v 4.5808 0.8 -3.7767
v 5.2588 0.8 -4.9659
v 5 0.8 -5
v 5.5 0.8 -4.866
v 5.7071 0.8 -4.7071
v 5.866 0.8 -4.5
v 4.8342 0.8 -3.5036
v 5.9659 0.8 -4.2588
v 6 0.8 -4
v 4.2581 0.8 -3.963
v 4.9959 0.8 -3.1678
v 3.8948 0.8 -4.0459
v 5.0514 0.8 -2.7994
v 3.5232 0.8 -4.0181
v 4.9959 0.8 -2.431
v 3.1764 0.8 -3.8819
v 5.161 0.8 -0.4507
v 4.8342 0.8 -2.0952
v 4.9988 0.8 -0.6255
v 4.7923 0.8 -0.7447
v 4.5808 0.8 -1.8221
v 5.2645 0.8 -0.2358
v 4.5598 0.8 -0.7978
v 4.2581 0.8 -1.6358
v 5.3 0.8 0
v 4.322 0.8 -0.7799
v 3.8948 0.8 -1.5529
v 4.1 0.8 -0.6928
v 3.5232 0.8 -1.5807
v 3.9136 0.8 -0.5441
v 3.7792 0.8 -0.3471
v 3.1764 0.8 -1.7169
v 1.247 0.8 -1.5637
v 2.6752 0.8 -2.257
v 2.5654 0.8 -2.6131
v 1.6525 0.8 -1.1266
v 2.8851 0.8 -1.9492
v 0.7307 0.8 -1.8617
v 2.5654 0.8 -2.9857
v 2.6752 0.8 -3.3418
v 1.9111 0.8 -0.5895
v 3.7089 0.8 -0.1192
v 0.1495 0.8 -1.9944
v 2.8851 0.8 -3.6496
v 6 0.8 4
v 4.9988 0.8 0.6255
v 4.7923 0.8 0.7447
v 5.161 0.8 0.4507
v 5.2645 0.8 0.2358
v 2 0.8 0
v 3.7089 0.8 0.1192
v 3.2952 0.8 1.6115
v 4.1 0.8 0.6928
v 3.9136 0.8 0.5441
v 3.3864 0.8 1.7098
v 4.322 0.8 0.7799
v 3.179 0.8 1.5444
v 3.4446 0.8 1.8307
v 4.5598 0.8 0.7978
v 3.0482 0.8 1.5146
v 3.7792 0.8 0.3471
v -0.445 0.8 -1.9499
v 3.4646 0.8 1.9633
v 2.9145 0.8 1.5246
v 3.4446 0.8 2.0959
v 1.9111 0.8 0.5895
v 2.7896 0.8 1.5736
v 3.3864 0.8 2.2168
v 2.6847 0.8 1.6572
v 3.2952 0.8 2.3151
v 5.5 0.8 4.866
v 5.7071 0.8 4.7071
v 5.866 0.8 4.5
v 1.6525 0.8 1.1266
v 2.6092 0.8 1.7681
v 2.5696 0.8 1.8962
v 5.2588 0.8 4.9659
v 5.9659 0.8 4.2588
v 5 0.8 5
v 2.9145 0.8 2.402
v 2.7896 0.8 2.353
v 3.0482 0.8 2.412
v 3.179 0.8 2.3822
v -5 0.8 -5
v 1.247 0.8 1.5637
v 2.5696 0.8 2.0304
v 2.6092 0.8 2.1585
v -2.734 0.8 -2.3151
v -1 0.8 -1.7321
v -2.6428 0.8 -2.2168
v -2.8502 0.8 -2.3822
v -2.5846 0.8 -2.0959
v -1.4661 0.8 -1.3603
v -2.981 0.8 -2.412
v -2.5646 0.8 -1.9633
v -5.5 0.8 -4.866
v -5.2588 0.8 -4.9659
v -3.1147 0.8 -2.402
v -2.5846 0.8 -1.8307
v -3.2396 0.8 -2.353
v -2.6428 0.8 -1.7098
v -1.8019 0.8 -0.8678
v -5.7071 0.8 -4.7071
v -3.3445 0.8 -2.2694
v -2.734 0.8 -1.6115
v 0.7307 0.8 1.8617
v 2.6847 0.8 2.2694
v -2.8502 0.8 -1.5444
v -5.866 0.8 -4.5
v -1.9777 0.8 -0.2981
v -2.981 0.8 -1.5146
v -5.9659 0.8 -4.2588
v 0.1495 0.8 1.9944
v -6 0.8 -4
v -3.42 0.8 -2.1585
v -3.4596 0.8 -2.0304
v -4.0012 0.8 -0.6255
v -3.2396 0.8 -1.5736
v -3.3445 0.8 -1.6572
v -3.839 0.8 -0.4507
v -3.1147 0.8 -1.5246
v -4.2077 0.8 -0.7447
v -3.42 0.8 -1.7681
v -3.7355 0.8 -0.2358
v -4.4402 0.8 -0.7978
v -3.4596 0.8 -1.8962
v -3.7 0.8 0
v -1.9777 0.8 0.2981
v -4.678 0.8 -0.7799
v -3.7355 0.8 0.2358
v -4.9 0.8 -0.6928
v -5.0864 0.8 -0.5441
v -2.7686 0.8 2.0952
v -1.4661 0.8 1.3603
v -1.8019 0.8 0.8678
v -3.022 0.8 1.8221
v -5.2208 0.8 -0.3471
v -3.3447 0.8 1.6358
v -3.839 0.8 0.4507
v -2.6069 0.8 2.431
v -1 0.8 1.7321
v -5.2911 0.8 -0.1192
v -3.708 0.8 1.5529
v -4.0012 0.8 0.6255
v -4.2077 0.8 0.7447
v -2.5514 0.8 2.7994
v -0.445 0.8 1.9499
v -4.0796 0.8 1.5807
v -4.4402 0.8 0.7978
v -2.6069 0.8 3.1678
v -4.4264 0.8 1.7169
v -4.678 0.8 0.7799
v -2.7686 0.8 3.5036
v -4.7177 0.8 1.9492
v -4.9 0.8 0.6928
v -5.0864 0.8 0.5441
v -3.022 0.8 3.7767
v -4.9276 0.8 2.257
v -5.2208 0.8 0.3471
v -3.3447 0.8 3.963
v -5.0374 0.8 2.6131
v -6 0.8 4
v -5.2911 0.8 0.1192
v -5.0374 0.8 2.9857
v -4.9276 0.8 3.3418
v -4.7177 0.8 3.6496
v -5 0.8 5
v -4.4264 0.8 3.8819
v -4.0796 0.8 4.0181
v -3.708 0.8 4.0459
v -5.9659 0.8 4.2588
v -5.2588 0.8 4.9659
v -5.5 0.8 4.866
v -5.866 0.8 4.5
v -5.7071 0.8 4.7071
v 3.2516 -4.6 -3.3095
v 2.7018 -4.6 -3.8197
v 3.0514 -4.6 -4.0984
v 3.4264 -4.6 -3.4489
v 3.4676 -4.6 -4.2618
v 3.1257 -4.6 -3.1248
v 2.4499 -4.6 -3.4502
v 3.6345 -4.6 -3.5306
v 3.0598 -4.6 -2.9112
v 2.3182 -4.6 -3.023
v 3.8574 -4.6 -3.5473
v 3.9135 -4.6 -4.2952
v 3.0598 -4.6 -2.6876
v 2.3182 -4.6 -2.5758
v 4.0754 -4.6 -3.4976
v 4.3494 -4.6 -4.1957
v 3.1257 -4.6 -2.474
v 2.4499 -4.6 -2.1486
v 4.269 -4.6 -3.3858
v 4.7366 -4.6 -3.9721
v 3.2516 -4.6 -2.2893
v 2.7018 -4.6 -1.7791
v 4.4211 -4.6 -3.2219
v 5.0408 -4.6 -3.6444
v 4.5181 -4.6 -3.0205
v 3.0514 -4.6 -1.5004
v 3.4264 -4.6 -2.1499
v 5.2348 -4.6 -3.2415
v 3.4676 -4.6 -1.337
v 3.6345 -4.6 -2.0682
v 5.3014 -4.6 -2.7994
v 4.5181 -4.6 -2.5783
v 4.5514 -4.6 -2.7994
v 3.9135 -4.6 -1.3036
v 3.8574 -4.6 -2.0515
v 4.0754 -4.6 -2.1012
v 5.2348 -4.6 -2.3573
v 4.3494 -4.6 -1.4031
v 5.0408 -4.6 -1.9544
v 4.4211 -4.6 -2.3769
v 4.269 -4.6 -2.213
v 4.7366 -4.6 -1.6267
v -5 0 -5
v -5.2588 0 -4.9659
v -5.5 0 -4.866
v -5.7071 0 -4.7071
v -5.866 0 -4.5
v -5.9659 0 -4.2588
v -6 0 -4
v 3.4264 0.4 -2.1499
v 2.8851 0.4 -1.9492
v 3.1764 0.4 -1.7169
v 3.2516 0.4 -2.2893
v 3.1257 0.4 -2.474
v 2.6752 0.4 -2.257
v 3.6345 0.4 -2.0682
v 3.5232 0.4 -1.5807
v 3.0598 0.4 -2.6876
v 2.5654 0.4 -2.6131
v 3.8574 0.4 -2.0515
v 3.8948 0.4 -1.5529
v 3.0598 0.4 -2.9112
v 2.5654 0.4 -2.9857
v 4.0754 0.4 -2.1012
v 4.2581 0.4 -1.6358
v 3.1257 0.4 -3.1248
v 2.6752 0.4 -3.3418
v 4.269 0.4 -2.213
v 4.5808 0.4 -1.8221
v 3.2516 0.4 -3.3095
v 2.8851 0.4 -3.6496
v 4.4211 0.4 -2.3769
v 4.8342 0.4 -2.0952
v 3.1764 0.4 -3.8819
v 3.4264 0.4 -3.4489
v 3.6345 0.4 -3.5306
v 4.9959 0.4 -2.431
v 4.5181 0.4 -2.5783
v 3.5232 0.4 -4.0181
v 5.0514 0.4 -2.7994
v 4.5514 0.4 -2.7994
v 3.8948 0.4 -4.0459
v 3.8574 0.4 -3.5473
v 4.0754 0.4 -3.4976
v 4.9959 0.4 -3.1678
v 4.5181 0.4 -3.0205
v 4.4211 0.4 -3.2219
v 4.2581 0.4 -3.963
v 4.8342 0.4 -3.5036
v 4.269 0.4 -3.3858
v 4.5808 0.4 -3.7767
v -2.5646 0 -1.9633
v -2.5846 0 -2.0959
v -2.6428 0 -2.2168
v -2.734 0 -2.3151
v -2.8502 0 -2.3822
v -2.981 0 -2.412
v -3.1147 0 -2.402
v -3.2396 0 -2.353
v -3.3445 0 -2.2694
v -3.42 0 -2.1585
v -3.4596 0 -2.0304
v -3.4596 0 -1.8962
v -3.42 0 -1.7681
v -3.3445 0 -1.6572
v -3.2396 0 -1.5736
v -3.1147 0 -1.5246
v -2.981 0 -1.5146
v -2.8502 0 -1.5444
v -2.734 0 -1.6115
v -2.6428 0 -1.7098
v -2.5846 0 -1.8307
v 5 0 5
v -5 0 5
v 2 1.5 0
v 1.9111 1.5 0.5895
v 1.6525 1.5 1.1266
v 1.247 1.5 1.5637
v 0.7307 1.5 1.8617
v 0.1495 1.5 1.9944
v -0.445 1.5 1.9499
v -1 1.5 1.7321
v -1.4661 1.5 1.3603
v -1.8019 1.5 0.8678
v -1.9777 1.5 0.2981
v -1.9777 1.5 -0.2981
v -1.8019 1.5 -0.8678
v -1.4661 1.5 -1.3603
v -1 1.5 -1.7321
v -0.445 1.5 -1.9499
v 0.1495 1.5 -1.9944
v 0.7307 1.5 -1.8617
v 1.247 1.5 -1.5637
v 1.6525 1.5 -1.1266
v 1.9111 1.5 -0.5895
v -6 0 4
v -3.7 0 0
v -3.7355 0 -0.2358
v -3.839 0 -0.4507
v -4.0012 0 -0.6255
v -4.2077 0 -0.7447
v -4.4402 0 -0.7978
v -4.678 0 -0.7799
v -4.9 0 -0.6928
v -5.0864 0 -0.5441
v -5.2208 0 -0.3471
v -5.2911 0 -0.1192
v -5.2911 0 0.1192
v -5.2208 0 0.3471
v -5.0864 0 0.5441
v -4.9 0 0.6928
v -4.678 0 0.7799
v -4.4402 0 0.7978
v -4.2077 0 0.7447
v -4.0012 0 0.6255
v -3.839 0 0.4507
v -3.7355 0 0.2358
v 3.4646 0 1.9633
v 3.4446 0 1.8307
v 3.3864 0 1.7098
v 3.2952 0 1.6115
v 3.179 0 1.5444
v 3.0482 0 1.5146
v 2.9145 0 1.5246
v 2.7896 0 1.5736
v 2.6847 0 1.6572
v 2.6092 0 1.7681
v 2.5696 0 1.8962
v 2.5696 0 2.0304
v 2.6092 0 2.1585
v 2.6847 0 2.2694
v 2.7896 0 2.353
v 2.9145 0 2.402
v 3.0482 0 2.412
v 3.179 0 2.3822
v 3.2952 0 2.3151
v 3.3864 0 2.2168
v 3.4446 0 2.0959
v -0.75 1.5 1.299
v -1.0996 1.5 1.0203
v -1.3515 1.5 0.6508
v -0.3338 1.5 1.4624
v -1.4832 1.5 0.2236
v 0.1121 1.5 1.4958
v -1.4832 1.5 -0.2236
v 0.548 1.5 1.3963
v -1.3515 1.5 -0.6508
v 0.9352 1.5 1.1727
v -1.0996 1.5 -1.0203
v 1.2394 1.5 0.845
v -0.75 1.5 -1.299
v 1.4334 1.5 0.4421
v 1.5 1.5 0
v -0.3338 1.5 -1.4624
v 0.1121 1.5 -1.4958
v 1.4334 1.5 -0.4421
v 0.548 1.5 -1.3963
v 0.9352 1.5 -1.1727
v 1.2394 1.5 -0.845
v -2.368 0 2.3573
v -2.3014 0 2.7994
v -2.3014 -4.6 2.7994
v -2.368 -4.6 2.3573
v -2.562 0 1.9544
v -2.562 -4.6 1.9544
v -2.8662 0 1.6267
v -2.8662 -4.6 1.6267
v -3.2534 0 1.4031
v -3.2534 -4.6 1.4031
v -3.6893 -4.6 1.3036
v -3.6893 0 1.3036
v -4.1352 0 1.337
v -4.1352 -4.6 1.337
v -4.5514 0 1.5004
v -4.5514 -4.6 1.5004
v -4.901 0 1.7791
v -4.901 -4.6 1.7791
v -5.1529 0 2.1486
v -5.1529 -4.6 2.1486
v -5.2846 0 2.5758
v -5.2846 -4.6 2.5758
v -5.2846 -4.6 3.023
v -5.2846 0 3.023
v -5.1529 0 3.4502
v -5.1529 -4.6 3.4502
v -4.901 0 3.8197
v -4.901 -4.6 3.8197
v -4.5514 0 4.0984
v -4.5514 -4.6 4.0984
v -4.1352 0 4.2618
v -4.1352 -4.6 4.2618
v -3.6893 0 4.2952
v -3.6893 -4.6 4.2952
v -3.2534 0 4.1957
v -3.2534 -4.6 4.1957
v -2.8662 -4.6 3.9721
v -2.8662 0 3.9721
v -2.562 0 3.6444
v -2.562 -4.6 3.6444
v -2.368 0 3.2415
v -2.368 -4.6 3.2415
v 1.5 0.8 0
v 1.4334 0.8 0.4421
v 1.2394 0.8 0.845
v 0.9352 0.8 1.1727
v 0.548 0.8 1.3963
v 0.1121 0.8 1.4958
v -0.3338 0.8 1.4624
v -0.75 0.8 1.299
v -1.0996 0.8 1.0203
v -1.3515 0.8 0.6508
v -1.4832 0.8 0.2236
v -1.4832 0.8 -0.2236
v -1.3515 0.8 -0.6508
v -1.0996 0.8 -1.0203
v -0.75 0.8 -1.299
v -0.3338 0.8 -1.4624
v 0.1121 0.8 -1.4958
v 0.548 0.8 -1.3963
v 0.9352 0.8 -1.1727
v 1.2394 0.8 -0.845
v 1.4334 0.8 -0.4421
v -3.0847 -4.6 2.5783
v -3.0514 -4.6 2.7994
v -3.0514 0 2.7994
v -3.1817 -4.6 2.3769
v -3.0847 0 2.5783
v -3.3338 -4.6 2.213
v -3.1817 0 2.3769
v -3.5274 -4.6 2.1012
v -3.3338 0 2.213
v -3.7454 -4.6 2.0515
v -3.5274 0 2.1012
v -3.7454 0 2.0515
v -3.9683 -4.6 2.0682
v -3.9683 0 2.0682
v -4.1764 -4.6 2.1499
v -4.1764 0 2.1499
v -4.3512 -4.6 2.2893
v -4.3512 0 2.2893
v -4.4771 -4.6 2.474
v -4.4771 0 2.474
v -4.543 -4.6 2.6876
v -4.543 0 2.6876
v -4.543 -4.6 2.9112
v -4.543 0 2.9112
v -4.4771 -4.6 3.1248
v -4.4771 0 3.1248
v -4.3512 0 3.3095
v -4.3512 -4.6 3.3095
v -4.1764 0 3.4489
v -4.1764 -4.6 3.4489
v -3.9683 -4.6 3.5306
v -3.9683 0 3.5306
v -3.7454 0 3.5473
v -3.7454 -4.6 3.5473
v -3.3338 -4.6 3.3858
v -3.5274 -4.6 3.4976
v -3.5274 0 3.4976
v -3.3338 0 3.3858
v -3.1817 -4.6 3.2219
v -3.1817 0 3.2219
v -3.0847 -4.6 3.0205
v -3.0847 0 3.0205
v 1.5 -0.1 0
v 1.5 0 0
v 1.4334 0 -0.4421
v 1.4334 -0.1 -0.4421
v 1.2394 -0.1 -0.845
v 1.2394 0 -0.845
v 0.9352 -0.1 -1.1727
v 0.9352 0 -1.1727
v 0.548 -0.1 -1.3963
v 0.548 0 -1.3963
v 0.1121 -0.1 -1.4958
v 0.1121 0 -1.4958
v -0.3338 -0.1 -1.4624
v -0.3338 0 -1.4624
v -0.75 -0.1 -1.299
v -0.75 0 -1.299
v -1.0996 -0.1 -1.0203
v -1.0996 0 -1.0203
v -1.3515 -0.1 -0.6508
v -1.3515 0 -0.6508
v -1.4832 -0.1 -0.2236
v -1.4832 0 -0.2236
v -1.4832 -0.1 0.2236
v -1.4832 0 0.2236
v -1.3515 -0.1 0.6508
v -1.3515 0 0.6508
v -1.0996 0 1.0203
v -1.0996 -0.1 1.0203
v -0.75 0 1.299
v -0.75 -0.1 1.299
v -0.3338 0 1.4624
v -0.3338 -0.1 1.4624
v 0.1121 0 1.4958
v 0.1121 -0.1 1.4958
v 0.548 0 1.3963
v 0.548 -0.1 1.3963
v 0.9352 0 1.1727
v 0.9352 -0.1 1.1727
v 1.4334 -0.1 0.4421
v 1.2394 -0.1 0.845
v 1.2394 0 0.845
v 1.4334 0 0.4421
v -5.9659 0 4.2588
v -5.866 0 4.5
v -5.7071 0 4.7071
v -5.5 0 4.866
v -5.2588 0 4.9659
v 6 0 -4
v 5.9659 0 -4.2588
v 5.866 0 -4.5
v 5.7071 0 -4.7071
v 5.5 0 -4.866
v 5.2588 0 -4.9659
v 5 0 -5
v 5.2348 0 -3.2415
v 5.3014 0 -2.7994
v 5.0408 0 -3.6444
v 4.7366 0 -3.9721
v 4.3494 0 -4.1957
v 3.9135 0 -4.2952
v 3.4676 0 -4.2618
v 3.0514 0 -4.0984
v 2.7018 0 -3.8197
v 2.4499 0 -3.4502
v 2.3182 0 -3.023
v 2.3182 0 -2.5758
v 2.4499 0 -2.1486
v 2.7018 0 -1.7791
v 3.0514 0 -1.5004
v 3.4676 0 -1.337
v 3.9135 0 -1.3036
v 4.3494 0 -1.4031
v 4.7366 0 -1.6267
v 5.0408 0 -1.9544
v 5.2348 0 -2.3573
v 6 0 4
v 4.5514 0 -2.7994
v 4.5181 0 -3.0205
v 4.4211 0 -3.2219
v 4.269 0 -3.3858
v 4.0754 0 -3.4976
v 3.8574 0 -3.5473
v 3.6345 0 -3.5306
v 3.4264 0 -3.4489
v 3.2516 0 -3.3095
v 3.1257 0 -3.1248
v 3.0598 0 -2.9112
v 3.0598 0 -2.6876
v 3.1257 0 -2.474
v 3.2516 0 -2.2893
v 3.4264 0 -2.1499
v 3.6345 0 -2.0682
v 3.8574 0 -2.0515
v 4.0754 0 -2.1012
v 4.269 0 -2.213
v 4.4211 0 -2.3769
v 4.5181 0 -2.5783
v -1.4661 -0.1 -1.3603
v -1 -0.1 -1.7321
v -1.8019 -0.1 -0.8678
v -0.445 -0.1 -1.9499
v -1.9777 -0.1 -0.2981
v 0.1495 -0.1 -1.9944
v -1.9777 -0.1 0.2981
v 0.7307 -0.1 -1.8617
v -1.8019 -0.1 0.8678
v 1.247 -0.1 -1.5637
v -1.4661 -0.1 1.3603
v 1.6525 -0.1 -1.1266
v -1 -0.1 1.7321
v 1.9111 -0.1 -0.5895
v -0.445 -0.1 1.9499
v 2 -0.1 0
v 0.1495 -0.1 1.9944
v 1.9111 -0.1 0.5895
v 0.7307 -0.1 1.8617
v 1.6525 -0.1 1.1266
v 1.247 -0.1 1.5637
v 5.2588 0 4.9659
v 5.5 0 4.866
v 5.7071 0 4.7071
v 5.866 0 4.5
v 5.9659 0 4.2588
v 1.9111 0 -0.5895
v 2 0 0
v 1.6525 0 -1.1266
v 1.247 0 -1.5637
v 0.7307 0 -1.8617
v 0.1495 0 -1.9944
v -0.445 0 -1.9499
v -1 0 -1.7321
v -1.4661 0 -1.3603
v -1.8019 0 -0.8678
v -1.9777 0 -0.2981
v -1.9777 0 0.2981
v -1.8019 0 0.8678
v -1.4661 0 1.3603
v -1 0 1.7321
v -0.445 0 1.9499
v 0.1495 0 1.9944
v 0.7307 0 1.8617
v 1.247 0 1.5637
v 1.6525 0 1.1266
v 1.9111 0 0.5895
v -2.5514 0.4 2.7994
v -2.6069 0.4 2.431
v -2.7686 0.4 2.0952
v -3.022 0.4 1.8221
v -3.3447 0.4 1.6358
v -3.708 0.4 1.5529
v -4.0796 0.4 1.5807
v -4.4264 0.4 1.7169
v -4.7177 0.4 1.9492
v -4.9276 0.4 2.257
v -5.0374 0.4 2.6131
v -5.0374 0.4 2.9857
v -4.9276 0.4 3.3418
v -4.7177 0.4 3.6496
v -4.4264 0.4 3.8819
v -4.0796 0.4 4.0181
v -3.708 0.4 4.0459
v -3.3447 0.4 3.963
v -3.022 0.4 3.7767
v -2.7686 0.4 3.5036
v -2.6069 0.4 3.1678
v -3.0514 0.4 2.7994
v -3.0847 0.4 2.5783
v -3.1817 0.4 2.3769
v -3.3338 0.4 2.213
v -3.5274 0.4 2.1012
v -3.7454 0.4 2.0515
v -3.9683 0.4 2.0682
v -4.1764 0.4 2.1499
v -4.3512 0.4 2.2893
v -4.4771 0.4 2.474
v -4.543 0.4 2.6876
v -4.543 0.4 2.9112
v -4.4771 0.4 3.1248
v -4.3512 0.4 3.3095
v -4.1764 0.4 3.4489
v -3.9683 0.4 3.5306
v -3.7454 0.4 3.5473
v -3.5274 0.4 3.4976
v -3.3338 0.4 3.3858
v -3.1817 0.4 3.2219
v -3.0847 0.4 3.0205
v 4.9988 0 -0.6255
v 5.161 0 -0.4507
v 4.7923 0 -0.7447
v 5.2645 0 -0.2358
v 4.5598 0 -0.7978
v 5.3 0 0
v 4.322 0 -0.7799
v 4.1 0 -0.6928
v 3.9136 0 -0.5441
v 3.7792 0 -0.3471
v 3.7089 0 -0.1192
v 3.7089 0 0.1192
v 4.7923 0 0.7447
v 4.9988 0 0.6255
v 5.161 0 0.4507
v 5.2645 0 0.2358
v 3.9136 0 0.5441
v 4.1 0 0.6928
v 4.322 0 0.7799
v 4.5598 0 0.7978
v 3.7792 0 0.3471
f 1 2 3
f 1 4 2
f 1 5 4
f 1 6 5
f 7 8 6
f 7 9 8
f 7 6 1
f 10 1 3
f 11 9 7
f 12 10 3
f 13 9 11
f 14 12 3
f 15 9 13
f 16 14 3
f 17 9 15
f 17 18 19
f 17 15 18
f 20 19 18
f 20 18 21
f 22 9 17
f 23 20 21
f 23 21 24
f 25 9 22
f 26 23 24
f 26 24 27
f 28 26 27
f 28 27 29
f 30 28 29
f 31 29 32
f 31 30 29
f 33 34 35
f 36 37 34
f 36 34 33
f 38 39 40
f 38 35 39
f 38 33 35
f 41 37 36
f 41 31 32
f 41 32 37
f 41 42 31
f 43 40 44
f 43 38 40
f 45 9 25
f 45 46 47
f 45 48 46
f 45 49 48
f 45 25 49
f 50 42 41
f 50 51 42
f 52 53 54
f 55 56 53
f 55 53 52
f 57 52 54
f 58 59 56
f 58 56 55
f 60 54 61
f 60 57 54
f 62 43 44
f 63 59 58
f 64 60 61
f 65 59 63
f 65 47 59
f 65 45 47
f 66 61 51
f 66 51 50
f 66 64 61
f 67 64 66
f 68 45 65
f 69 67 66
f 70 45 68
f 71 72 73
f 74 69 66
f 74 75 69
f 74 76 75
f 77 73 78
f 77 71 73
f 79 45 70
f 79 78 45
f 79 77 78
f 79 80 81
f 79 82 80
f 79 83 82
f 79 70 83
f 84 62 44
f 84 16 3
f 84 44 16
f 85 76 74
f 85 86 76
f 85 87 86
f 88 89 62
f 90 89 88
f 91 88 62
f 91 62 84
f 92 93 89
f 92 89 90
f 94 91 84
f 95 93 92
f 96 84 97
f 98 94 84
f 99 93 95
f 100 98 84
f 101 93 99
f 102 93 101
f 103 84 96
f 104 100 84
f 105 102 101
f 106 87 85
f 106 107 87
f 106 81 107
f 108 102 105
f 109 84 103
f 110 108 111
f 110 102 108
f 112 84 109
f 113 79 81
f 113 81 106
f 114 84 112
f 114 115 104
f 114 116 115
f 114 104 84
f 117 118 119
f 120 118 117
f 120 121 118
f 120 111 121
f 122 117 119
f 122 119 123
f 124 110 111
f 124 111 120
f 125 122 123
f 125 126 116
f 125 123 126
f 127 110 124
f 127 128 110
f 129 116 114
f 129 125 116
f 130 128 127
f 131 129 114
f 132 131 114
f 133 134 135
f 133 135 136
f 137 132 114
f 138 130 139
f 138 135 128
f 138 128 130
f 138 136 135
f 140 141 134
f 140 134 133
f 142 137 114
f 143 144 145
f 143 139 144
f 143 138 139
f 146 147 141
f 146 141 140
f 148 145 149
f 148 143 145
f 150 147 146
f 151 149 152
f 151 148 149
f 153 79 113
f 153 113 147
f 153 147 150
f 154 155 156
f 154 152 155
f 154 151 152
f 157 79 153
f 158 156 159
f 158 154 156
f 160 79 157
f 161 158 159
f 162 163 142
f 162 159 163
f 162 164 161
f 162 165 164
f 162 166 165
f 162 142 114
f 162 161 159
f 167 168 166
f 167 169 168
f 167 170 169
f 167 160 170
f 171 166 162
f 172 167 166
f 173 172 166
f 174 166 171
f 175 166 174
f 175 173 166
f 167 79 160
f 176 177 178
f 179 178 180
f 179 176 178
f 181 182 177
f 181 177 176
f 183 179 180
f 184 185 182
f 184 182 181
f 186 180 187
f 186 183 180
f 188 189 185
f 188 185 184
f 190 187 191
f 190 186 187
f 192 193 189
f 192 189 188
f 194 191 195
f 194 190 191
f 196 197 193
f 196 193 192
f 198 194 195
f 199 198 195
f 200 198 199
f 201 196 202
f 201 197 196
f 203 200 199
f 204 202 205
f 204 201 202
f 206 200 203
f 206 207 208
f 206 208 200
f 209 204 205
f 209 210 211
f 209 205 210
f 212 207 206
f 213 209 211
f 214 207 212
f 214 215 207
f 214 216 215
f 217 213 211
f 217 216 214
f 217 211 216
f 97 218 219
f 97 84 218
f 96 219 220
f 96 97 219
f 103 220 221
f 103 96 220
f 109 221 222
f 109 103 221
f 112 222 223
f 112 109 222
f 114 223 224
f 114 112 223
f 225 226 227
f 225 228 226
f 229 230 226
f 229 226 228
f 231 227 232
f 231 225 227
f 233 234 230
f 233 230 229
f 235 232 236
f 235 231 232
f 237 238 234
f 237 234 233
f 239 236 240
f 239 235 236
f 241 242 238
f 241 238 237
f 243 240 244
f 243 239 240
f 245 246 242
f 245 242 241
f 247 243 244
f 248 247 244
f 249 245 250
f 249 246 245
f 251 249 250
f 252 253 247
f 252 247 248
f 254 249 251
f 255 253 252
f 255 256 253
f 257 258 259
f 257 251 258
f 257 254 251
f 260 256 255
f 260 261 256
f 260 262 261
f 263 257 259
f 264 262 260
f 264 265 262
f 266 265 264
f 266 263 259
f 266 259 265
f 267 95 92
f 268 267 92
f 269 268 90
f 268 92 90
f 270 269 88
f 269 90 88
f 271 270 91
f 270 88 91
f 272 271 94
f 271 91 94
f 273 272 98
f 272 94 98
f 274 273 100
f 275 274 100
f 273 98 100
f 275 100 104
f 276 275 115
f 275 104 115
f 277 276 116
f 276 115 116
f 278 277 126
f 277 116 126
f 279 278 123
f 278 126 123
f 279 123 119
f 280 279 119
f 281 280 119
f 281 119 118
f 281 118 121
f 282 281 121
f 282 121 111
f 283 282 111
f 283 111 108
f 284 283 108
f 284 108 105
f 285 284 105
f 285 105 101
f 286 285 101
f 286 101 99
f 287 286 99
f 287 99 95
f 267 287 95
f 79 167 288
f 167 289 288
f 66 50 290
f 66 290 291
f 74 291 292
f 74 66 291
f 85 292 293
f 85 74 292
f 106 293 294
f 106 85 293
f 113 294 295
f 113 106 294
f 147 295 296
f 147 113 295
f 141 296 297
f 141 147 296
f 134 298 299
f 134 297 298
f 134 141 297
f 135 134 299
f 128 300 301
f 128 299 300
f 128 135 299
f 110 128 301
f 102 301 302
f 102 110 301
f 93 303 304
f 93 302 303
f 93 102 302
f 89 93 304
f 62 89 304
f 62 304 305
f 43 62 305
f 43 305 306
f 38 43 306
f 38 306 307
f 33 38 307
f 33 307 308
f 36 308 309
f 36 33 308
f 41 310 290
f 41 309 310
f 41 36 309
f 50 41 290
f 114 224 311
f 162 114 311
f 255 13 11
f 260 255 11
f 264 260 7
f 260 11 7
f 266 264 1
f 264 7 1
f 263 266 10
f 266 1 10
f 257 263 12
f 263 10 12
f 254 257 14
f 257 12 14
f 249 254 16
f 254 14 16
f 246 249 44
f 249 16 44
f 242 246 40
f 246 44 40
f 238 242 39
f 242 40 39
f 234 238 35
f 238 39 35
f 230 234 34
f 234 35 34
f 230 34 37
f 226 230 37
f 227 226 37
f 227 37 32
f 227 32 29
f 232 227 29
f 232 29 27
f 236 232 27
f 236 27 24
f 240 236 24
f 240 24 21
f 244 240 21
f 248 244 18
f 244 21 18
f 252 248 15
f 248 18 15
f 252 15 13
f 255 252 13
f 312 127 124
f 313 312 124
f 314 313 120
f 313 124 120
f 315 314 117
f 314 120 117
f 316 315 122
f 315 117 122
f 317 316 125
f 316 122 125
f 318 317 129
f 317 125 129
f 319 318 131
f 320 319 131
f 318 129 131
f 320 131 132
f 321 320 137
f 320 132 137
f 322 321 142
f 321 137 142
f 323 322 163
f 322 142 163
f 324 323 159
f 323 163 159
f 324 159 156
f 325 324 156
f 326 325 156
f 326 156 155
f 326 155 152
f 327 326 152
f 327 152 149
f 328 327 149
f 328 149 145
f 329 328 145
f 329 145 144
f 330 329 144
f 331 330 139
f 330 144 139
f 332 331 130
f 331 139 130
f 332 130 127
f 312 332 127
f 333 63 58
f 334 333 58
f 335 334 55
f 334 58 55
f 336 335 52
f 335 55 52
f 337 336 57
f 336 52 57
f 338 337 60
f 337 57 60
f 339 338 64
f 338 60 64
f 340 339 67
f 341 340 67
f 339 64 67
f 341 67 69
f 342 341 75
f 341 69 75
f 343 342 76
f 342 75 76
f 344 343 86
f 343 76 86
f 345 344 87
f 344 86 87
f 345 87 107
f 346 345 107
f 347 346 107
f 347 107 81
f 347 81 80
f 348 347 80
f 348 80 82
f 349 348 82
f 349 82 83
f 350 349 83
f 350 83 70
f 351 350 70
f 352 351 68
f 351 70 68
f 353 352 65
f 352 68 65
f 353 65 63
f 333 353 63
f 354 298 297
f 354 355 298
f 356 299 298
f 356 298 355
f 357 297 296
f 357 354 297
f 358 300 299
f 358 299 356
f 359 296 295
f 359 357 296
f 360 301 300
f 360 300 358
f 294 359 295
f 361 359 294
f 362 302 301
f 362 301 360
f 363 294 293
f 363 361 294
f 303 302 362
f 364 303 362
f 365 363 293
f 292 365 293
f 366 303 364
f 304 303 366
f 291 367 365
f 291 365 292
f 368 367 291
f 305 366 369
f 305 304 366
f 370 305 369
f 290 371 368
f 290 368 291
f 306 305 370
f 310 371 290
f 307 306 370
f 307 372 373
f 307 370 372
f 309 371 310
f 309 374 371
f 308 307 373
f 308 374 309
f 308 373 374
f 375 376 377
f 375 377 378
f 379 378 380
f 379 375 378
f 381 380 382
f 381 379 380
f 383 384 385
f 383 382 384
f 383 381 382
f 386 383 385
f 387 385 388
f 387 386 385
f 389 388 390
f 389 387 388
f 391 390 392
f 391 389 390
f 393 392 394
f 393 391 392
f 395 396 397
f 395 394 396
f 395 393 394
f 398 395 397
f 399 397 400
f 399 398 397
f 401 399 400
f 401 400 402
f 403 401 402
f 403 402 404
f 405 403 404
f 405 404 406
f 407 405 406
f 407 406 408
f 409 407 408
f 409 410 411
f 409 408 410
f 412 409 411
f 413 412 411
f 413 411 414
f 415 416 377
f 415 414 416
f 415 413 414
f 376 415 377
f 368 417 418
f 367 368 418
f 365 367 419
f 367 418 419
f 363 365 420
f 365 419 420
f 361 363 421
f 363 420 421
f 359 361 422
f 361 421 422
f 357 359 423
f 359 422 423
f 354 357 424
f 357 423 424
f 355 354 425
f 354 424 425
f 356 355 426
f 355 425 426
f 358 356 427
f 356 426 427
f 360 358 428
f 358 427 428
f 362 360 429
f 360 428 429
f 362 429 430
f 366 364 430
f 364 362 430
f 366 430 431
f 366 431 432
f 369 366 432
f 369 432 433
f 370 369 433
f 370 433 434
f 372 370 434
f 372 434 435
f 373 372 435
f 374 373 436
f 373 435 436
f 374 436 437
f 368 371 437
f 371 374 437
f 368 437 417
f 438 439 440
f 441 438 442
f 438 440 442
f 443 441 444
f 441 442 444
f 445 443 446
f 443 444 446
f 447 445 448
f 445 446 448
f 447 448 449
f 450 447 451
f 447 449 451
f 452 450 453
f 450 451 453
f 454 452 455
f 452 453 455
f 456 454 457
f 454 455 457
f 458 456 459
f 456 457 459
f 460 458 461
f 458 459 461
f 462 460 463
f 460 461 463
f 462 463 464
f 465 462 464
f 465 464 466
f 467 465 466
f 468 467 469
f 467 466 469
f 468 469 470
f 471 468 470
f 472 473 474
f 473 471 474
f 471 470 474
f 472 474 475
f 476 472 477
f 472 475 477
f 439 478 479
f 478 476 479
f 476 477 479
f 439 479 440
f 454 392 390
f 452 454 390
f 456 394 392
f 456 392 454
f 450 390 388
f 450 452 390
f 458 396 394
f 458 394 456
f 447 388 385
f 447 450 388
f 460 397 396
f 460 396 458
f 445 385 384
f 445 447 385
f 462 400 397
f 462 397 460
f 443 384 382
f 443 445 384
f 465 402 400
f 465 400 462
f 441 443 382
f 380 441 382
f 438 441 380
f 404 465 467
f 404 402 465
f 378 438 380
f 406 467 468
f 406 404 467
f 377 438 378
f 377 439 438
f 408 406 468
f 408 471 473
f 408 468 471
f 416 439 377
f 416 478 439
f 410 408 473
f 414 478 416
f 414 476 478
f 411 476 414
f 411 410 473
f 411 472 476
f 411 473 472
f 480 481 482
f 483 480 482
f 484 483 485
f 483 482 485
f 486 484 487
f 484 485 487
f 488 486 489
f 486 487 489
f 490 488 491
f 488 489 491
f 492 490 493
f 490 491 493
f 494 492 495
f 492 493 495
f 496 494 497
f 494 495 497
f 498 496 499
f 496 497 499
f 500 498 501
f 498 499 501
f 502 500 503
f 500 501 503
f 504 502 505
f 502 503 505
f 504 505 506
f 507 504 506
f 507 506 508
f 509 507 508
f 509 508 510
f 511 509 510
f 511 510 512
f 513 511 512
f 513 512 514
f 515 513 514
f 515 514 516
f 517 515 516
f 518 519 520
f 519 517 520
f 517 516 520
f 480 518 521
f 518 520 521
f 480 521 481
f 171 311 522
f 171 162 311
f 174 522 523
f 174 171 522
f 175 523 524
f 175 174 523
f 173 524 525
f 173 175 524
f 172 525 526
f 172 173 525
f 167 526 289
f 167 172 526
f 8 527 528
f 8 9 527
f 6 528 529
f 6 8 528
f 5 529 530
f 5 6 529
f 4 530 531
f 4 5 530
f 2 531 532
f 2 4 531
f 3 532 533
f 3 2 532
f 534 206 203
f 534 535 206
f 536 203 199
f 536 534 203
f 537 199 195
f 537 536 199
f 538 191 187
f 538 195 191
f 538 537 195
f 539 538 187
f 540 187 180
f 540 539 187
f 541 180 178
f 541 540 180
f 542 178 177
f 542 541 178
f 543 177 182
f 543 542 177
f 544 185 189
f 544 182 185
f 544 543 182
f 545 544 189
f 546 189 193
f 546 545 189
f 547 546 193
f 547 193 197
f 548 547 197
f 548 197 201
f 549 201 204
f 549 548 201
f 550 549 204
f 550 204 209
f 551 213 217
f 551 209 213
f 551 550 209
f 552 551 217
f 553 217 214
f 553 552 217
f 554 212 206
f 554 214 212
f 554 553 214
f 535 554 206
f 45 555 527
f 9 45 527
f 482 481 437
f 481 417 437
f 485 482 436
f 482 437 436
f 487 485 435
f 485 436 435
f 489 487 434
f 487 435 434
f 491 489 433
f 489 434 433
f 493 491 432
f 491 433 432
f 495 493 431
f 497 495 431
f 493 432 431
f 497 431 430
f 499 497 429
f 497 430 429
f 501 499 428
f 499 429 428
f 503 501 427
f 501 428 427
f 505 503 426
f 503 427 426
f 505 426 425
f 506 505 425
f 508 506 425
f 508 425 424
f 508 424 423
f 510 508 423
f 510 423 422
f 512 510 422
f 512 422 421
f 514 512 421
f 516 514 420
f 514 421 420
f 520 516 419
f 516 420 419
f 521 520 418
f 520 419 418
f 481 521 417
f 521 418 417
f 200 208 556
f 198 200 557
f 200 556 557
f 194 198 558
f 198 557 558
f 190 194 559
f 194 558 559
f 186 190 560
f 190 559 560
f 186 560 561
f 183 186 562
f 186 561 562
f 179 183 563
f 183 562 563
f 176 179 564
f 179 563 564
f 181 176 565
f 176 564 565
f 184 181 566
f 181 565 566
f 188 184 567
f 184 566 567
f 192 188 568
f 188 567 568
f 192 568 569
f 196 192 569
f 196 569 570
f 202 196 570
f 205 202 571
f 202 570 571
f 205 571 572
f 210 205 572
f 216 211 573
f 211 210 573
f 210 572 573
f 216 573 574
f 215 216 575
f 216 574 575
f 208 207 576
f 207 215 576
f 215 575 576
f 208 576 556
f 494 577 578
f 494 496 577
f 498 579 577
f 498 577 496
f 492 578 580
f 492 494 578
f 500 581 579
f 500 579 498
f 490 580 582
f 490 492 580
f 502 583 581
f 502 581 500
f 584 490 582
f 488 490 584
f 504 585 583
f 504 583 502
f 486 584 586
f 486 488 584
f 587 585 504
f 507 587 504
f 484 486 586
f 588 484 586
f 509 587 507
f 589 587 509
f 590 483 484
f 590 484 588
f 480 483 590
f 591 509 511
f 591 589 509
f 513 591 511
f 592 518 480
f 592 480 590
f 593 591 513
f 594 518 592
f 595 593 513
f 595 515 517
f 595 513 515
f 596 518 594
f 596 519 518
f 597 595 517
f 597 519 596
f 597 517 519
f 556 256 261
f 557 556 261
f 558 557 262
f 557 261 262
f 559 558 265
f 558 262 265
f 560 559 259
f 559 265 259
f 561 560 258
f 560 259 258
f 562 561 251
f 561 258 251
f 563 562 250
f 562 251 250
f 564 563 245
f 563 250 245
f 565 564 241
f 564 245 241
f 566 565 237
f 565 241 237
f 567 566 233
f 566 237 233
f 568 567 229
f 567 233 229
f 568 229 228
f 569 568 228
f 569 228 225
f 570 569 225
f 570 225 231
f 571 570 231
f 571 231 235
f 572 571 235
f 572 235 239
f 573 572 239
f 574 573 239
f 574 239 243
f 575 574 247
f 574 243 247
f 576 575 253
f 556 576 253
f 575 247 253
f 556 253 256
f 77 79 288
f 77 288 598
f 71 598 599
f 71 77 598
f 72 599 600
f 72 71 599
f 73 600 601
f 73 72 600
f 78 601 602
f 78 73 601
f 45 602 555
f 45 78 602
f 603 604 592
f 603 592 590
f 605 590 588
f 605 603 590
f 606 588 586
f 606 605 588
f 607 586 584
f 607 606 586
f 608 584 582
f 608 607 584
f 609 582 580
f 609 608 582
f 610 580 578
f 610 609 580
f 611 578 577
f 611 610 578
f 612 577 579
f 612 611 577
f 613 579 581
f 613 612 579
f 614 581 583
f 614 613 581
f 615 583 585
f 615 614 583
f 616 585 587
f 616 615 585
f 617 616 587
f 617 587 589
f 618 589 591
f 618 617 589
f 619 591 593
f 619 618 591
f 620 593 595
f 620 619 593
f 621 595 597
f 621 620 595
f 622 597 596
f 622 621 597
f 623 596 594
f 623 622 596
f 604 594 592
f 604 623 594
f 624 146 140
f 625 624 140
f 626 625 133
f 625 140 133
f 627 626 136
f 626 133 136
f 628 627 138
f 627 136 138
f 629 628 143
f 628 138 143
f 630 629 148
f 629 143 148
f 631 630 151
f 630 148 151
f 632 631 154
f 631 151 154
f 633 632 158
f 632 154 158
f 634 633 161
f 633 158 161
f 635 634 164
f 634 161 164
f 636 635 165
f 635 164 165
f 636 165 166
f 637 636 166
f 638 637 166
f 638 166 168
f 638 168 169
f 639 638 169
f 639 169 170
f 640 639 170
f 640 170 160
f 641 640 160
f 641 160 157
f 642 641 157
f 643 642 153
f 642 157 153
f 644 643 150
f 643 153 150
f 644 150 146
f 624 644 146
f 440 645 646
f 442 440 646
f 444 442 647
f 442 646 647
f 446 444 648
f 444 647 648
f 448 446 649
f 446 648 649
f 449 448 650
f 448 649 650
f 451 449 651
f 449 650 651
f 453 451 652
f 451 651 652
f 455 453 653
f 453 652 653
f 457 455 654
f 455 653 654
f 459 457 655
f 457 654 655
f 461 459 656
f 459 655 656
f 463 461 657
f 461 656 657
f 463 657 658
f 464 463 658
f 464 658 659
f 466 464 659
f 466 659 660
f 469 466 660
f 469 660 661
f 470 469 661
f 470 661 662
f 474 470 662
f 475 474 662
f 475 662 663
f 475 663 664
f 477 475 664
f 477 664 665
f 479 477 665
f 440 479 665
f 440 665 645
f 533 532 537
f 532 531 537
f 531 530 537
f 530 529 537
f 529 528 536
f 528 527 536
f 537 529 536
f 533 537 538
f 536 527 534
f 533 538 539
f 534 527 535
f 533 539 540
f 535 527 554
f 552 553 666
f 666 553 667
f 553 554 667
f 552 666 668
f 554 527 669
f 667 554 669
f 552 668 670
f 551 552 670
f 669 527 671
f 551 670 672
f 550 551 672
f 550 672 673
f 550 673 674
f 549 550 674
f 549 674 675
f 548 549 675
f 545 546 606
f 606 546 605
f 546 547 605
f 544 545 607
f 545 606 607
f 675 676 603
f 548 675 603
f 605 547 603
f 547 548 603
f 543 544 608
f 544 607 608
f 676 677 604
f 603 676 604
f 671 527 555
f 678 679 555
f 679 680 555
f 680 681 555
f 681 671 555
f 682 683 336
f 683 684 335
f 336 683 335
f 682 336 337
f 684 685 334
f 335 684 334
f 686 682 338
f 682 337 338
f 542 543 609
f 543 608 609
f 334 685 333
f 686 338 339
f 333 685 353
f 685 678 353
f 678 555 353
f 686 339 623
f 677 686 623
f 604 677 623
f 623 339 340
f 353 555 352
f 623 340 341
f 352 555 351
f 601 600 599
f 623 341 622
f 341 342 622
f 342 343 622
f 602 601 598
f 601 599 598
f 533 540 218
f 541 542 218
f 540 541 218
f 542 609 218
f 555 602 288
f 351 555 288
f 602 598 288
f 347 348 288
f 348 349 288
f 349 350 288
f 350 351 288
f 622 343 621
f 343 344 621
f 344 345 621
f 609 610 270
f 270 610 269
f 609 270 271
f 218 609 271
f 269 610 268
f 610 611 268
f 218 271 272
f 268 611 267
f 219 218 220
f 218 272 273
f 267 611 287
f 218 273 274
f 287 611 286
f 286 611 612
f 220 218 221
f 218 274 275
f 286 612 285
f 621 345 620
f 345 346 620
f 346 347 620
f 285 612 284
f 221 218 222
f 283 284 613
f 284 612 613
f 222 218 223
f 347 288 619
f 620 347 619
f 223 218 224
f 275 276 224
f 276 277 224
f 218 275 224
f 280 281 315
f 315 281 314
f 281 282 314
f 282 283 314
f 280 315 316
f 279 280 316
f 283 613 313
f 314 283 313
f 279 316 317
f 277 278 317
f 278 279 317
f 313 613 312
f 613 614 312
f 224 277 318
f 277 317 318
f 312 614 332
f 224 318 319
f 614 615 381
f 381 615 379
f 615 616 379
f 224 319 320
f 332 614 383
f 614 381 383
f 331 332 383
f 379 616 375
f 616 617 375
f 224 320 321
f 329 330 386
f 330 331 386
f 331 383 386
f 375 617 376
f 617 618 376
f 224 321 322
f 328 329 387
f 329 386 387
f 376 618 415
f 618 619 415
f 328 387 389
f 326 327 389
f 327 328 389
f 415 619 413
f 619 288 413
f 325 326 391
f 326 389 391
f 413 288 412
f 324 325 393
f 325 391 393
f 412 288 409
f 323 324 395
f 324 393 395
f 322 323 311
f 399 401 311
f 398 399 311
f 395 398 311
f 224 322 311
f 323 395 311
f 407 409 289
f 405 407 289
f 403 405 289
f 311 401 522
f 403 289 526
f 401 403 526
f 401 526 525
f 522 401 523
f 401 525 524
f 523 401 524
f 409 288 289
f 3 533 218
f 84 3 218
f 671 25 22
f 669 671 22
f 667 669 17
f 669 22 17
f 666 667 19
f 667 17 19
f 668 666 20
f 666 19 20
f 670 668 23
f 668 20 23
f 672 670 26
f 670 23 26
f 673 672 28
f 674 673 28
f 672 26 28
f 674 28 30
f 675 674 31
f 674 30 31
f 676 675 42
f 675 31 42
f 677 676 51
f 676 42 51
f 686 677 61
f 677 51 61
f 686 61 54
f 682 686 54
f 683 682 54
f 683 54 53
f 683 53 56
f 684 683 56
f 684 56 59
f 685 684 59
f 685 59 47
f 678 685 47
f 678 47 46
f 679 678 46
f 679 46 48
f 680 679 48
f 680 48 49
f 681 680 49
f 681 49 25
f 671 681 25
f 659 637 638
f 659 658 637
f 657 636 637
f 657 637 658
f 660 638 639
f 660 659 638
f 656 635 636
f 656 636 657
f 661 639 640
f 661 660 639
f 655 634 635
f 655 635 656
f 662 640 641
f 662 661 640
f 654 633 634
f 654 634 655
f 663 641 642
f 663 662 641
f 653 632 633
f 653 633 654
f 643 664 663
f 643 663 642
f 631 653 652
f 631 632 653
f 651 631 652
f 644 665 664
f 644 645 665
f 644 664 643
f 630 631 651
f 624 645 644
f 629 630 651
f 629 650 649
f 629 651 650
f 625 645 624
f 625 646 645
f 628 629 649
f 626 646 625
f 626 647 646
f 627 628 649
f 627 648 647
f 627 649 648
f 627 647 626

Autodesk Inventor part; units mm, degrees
ref_plane "YZ Plane" through (0, 0, 0) normal (1, 0, 0) x (0, 1, 0)
ref_plane "XZ Plane" through (0, 0, 0) normal (0, 1, 0) x (-1, 0, 0)
ref_plane "XY Plane" through (0, 0, 0) normal (0, 0, 1) x (1, 0, 0)
sketch "Esboço1" plane through (0, 0, 0) normal (0, 1, 0) x (-1, 0, 0)
  line L0 (6, 5) -> (-6, 5)
  line L1 (-6, 5) -> (-6, -5)
  line L2 (-6, -5) -> (6, -5)
  line L3 (6, -5) -> (6, 5)
  line L4 (6, 5) -> (-6, -5) construction
  line L5 (-6, 5) -> (6, -5) construction
  point P0 (0, 0)
  dimension "d0" = 12
  dimension "d1" = 10
extrude "Extrusão1" add sketch "Esboço1" along normal blind 0.8
fillet "Arredondamento1" radius 1 4 edges at (-6, 0.4, 5) (6, 0.4, 5) (6, 0.4, -5) (-6, 0.4, -5)
sketch "Esboço2" plane through (0, 0.8, 0) normal (0, 1, 0) x (1, 0, 0)
  circle A0 centre (0, 0) radius 2
  circle A1 centre (0, 0) radius 1.5
  dimension "d5" = 4
  dimension "d6" = 3
extrude "Extrusão2" add sketch "Esboço2" along normal blind 0.7
extrude "Extrusão3" cut sketch "Esboço2" against normal blind 0.8 contours A1
sketch "Esboço3" plane through (0, 0.8, 0) normal (0, 1, 0) x (1, 0, 0)
  circle A0 centre (4.5, 0) radius 0.8
  circle A1 centre (0, 0) radius 1.5 projected
  line L0 (0, -1.5) -> (0, 1.5)
  circle A2 centre (-4.5, 0) radius 0.8
  circle A3 centre (0, 0) radius 1.5
  dimension "d11" = 1.6
extrude "Extrusão4" cut sketch "Esboço3" against normal blind 0.8 contours A0 | A2
sketch "Esboço4" plane through (0, 0.8, 0) normal (0, 1, 0) x (1, 0, 0)
  circle A0 centre (-3.0146, 1.9633) radius 0.45
  circle A1 centre (0, 0) radius 2 projected
  line L0 (5, 5) -> (-5, 5) projected
  line L1 (-5, -5) -> (5, -5) projected
  circle A2 centre (3.0146, -1.9633) radius 0.45
  dimension "d14" = 0.9
  dimension "d15" = 0.9
extrude "Extrusão5" cut sketch "Esboço4" against normal blind 0.8 contours A0 | A2
sketch "Esboço5" plane through (0, 0.8, 0) normal (0, 1, 0) x (1, 0, 0)
  circle A0 centre (3.8014, 2.7994) radius 1.25
  circle A1 centre (-3.8014, -2.7994) radius 1.25
  circle A2 centre (3.8014, 2.7994) radius 0.75
  circle A3 centre (-3.8014, -2.7994) radius 0.75
  point P0 (0, 0)
  dimension "d18" = 2.5
  dimension "d19" = 2.5
  dimension "d22" = 1.5
  dimension "d30" = 1.5
extrude "Extrusão6" cut sketch "Esboço5" against normal blind 0.4 contours A0 | A1 | A2 | A3
extrude "Extrusão7" cut sketch "Esboço5" against normal blind 10 contours A2 | A3
sketch "Esboço6" plane through (0, 0, 0) normal (0, -1, 0) x (1, 0, 0)
  circle A0 centre (-3.8014, 2.7994) radius 0.75 projected
  circle A1 centre (-3.8014, 2.7994) radius 1.5
  circle A2 centre (3.8014, -2.7994) radius 0.75 projected
  circle A3 centre (3.8014, -2.7994) radius 1.5
  point P0 (0, 0)
  dimension "d26" = 3
  dimension "d27" = 3
extrude "Extrusão8" add sketch "Esboço6" along normal blind 4.6
thread "Rosca1" size "M1.6x0.35" class "6H" standard "ANSI Metric M Profile" full length
thread "Rosca2" size "M1.6x0.35" class "6H" standard "ANSI Metric M Profile" full length
sketch "Esboço10" plane through (0, 0, 0) normal (0, -1, 0) x (1, 0, 0)
  circle A0 centre (0, 0) radius 2 projected
  circle A1 centre (0, 0) radius 1.5 projected
extrude "Extrusão9" add sketch "Esboço10" along normal blind 0.1
properties part number "Chapa Superior"
